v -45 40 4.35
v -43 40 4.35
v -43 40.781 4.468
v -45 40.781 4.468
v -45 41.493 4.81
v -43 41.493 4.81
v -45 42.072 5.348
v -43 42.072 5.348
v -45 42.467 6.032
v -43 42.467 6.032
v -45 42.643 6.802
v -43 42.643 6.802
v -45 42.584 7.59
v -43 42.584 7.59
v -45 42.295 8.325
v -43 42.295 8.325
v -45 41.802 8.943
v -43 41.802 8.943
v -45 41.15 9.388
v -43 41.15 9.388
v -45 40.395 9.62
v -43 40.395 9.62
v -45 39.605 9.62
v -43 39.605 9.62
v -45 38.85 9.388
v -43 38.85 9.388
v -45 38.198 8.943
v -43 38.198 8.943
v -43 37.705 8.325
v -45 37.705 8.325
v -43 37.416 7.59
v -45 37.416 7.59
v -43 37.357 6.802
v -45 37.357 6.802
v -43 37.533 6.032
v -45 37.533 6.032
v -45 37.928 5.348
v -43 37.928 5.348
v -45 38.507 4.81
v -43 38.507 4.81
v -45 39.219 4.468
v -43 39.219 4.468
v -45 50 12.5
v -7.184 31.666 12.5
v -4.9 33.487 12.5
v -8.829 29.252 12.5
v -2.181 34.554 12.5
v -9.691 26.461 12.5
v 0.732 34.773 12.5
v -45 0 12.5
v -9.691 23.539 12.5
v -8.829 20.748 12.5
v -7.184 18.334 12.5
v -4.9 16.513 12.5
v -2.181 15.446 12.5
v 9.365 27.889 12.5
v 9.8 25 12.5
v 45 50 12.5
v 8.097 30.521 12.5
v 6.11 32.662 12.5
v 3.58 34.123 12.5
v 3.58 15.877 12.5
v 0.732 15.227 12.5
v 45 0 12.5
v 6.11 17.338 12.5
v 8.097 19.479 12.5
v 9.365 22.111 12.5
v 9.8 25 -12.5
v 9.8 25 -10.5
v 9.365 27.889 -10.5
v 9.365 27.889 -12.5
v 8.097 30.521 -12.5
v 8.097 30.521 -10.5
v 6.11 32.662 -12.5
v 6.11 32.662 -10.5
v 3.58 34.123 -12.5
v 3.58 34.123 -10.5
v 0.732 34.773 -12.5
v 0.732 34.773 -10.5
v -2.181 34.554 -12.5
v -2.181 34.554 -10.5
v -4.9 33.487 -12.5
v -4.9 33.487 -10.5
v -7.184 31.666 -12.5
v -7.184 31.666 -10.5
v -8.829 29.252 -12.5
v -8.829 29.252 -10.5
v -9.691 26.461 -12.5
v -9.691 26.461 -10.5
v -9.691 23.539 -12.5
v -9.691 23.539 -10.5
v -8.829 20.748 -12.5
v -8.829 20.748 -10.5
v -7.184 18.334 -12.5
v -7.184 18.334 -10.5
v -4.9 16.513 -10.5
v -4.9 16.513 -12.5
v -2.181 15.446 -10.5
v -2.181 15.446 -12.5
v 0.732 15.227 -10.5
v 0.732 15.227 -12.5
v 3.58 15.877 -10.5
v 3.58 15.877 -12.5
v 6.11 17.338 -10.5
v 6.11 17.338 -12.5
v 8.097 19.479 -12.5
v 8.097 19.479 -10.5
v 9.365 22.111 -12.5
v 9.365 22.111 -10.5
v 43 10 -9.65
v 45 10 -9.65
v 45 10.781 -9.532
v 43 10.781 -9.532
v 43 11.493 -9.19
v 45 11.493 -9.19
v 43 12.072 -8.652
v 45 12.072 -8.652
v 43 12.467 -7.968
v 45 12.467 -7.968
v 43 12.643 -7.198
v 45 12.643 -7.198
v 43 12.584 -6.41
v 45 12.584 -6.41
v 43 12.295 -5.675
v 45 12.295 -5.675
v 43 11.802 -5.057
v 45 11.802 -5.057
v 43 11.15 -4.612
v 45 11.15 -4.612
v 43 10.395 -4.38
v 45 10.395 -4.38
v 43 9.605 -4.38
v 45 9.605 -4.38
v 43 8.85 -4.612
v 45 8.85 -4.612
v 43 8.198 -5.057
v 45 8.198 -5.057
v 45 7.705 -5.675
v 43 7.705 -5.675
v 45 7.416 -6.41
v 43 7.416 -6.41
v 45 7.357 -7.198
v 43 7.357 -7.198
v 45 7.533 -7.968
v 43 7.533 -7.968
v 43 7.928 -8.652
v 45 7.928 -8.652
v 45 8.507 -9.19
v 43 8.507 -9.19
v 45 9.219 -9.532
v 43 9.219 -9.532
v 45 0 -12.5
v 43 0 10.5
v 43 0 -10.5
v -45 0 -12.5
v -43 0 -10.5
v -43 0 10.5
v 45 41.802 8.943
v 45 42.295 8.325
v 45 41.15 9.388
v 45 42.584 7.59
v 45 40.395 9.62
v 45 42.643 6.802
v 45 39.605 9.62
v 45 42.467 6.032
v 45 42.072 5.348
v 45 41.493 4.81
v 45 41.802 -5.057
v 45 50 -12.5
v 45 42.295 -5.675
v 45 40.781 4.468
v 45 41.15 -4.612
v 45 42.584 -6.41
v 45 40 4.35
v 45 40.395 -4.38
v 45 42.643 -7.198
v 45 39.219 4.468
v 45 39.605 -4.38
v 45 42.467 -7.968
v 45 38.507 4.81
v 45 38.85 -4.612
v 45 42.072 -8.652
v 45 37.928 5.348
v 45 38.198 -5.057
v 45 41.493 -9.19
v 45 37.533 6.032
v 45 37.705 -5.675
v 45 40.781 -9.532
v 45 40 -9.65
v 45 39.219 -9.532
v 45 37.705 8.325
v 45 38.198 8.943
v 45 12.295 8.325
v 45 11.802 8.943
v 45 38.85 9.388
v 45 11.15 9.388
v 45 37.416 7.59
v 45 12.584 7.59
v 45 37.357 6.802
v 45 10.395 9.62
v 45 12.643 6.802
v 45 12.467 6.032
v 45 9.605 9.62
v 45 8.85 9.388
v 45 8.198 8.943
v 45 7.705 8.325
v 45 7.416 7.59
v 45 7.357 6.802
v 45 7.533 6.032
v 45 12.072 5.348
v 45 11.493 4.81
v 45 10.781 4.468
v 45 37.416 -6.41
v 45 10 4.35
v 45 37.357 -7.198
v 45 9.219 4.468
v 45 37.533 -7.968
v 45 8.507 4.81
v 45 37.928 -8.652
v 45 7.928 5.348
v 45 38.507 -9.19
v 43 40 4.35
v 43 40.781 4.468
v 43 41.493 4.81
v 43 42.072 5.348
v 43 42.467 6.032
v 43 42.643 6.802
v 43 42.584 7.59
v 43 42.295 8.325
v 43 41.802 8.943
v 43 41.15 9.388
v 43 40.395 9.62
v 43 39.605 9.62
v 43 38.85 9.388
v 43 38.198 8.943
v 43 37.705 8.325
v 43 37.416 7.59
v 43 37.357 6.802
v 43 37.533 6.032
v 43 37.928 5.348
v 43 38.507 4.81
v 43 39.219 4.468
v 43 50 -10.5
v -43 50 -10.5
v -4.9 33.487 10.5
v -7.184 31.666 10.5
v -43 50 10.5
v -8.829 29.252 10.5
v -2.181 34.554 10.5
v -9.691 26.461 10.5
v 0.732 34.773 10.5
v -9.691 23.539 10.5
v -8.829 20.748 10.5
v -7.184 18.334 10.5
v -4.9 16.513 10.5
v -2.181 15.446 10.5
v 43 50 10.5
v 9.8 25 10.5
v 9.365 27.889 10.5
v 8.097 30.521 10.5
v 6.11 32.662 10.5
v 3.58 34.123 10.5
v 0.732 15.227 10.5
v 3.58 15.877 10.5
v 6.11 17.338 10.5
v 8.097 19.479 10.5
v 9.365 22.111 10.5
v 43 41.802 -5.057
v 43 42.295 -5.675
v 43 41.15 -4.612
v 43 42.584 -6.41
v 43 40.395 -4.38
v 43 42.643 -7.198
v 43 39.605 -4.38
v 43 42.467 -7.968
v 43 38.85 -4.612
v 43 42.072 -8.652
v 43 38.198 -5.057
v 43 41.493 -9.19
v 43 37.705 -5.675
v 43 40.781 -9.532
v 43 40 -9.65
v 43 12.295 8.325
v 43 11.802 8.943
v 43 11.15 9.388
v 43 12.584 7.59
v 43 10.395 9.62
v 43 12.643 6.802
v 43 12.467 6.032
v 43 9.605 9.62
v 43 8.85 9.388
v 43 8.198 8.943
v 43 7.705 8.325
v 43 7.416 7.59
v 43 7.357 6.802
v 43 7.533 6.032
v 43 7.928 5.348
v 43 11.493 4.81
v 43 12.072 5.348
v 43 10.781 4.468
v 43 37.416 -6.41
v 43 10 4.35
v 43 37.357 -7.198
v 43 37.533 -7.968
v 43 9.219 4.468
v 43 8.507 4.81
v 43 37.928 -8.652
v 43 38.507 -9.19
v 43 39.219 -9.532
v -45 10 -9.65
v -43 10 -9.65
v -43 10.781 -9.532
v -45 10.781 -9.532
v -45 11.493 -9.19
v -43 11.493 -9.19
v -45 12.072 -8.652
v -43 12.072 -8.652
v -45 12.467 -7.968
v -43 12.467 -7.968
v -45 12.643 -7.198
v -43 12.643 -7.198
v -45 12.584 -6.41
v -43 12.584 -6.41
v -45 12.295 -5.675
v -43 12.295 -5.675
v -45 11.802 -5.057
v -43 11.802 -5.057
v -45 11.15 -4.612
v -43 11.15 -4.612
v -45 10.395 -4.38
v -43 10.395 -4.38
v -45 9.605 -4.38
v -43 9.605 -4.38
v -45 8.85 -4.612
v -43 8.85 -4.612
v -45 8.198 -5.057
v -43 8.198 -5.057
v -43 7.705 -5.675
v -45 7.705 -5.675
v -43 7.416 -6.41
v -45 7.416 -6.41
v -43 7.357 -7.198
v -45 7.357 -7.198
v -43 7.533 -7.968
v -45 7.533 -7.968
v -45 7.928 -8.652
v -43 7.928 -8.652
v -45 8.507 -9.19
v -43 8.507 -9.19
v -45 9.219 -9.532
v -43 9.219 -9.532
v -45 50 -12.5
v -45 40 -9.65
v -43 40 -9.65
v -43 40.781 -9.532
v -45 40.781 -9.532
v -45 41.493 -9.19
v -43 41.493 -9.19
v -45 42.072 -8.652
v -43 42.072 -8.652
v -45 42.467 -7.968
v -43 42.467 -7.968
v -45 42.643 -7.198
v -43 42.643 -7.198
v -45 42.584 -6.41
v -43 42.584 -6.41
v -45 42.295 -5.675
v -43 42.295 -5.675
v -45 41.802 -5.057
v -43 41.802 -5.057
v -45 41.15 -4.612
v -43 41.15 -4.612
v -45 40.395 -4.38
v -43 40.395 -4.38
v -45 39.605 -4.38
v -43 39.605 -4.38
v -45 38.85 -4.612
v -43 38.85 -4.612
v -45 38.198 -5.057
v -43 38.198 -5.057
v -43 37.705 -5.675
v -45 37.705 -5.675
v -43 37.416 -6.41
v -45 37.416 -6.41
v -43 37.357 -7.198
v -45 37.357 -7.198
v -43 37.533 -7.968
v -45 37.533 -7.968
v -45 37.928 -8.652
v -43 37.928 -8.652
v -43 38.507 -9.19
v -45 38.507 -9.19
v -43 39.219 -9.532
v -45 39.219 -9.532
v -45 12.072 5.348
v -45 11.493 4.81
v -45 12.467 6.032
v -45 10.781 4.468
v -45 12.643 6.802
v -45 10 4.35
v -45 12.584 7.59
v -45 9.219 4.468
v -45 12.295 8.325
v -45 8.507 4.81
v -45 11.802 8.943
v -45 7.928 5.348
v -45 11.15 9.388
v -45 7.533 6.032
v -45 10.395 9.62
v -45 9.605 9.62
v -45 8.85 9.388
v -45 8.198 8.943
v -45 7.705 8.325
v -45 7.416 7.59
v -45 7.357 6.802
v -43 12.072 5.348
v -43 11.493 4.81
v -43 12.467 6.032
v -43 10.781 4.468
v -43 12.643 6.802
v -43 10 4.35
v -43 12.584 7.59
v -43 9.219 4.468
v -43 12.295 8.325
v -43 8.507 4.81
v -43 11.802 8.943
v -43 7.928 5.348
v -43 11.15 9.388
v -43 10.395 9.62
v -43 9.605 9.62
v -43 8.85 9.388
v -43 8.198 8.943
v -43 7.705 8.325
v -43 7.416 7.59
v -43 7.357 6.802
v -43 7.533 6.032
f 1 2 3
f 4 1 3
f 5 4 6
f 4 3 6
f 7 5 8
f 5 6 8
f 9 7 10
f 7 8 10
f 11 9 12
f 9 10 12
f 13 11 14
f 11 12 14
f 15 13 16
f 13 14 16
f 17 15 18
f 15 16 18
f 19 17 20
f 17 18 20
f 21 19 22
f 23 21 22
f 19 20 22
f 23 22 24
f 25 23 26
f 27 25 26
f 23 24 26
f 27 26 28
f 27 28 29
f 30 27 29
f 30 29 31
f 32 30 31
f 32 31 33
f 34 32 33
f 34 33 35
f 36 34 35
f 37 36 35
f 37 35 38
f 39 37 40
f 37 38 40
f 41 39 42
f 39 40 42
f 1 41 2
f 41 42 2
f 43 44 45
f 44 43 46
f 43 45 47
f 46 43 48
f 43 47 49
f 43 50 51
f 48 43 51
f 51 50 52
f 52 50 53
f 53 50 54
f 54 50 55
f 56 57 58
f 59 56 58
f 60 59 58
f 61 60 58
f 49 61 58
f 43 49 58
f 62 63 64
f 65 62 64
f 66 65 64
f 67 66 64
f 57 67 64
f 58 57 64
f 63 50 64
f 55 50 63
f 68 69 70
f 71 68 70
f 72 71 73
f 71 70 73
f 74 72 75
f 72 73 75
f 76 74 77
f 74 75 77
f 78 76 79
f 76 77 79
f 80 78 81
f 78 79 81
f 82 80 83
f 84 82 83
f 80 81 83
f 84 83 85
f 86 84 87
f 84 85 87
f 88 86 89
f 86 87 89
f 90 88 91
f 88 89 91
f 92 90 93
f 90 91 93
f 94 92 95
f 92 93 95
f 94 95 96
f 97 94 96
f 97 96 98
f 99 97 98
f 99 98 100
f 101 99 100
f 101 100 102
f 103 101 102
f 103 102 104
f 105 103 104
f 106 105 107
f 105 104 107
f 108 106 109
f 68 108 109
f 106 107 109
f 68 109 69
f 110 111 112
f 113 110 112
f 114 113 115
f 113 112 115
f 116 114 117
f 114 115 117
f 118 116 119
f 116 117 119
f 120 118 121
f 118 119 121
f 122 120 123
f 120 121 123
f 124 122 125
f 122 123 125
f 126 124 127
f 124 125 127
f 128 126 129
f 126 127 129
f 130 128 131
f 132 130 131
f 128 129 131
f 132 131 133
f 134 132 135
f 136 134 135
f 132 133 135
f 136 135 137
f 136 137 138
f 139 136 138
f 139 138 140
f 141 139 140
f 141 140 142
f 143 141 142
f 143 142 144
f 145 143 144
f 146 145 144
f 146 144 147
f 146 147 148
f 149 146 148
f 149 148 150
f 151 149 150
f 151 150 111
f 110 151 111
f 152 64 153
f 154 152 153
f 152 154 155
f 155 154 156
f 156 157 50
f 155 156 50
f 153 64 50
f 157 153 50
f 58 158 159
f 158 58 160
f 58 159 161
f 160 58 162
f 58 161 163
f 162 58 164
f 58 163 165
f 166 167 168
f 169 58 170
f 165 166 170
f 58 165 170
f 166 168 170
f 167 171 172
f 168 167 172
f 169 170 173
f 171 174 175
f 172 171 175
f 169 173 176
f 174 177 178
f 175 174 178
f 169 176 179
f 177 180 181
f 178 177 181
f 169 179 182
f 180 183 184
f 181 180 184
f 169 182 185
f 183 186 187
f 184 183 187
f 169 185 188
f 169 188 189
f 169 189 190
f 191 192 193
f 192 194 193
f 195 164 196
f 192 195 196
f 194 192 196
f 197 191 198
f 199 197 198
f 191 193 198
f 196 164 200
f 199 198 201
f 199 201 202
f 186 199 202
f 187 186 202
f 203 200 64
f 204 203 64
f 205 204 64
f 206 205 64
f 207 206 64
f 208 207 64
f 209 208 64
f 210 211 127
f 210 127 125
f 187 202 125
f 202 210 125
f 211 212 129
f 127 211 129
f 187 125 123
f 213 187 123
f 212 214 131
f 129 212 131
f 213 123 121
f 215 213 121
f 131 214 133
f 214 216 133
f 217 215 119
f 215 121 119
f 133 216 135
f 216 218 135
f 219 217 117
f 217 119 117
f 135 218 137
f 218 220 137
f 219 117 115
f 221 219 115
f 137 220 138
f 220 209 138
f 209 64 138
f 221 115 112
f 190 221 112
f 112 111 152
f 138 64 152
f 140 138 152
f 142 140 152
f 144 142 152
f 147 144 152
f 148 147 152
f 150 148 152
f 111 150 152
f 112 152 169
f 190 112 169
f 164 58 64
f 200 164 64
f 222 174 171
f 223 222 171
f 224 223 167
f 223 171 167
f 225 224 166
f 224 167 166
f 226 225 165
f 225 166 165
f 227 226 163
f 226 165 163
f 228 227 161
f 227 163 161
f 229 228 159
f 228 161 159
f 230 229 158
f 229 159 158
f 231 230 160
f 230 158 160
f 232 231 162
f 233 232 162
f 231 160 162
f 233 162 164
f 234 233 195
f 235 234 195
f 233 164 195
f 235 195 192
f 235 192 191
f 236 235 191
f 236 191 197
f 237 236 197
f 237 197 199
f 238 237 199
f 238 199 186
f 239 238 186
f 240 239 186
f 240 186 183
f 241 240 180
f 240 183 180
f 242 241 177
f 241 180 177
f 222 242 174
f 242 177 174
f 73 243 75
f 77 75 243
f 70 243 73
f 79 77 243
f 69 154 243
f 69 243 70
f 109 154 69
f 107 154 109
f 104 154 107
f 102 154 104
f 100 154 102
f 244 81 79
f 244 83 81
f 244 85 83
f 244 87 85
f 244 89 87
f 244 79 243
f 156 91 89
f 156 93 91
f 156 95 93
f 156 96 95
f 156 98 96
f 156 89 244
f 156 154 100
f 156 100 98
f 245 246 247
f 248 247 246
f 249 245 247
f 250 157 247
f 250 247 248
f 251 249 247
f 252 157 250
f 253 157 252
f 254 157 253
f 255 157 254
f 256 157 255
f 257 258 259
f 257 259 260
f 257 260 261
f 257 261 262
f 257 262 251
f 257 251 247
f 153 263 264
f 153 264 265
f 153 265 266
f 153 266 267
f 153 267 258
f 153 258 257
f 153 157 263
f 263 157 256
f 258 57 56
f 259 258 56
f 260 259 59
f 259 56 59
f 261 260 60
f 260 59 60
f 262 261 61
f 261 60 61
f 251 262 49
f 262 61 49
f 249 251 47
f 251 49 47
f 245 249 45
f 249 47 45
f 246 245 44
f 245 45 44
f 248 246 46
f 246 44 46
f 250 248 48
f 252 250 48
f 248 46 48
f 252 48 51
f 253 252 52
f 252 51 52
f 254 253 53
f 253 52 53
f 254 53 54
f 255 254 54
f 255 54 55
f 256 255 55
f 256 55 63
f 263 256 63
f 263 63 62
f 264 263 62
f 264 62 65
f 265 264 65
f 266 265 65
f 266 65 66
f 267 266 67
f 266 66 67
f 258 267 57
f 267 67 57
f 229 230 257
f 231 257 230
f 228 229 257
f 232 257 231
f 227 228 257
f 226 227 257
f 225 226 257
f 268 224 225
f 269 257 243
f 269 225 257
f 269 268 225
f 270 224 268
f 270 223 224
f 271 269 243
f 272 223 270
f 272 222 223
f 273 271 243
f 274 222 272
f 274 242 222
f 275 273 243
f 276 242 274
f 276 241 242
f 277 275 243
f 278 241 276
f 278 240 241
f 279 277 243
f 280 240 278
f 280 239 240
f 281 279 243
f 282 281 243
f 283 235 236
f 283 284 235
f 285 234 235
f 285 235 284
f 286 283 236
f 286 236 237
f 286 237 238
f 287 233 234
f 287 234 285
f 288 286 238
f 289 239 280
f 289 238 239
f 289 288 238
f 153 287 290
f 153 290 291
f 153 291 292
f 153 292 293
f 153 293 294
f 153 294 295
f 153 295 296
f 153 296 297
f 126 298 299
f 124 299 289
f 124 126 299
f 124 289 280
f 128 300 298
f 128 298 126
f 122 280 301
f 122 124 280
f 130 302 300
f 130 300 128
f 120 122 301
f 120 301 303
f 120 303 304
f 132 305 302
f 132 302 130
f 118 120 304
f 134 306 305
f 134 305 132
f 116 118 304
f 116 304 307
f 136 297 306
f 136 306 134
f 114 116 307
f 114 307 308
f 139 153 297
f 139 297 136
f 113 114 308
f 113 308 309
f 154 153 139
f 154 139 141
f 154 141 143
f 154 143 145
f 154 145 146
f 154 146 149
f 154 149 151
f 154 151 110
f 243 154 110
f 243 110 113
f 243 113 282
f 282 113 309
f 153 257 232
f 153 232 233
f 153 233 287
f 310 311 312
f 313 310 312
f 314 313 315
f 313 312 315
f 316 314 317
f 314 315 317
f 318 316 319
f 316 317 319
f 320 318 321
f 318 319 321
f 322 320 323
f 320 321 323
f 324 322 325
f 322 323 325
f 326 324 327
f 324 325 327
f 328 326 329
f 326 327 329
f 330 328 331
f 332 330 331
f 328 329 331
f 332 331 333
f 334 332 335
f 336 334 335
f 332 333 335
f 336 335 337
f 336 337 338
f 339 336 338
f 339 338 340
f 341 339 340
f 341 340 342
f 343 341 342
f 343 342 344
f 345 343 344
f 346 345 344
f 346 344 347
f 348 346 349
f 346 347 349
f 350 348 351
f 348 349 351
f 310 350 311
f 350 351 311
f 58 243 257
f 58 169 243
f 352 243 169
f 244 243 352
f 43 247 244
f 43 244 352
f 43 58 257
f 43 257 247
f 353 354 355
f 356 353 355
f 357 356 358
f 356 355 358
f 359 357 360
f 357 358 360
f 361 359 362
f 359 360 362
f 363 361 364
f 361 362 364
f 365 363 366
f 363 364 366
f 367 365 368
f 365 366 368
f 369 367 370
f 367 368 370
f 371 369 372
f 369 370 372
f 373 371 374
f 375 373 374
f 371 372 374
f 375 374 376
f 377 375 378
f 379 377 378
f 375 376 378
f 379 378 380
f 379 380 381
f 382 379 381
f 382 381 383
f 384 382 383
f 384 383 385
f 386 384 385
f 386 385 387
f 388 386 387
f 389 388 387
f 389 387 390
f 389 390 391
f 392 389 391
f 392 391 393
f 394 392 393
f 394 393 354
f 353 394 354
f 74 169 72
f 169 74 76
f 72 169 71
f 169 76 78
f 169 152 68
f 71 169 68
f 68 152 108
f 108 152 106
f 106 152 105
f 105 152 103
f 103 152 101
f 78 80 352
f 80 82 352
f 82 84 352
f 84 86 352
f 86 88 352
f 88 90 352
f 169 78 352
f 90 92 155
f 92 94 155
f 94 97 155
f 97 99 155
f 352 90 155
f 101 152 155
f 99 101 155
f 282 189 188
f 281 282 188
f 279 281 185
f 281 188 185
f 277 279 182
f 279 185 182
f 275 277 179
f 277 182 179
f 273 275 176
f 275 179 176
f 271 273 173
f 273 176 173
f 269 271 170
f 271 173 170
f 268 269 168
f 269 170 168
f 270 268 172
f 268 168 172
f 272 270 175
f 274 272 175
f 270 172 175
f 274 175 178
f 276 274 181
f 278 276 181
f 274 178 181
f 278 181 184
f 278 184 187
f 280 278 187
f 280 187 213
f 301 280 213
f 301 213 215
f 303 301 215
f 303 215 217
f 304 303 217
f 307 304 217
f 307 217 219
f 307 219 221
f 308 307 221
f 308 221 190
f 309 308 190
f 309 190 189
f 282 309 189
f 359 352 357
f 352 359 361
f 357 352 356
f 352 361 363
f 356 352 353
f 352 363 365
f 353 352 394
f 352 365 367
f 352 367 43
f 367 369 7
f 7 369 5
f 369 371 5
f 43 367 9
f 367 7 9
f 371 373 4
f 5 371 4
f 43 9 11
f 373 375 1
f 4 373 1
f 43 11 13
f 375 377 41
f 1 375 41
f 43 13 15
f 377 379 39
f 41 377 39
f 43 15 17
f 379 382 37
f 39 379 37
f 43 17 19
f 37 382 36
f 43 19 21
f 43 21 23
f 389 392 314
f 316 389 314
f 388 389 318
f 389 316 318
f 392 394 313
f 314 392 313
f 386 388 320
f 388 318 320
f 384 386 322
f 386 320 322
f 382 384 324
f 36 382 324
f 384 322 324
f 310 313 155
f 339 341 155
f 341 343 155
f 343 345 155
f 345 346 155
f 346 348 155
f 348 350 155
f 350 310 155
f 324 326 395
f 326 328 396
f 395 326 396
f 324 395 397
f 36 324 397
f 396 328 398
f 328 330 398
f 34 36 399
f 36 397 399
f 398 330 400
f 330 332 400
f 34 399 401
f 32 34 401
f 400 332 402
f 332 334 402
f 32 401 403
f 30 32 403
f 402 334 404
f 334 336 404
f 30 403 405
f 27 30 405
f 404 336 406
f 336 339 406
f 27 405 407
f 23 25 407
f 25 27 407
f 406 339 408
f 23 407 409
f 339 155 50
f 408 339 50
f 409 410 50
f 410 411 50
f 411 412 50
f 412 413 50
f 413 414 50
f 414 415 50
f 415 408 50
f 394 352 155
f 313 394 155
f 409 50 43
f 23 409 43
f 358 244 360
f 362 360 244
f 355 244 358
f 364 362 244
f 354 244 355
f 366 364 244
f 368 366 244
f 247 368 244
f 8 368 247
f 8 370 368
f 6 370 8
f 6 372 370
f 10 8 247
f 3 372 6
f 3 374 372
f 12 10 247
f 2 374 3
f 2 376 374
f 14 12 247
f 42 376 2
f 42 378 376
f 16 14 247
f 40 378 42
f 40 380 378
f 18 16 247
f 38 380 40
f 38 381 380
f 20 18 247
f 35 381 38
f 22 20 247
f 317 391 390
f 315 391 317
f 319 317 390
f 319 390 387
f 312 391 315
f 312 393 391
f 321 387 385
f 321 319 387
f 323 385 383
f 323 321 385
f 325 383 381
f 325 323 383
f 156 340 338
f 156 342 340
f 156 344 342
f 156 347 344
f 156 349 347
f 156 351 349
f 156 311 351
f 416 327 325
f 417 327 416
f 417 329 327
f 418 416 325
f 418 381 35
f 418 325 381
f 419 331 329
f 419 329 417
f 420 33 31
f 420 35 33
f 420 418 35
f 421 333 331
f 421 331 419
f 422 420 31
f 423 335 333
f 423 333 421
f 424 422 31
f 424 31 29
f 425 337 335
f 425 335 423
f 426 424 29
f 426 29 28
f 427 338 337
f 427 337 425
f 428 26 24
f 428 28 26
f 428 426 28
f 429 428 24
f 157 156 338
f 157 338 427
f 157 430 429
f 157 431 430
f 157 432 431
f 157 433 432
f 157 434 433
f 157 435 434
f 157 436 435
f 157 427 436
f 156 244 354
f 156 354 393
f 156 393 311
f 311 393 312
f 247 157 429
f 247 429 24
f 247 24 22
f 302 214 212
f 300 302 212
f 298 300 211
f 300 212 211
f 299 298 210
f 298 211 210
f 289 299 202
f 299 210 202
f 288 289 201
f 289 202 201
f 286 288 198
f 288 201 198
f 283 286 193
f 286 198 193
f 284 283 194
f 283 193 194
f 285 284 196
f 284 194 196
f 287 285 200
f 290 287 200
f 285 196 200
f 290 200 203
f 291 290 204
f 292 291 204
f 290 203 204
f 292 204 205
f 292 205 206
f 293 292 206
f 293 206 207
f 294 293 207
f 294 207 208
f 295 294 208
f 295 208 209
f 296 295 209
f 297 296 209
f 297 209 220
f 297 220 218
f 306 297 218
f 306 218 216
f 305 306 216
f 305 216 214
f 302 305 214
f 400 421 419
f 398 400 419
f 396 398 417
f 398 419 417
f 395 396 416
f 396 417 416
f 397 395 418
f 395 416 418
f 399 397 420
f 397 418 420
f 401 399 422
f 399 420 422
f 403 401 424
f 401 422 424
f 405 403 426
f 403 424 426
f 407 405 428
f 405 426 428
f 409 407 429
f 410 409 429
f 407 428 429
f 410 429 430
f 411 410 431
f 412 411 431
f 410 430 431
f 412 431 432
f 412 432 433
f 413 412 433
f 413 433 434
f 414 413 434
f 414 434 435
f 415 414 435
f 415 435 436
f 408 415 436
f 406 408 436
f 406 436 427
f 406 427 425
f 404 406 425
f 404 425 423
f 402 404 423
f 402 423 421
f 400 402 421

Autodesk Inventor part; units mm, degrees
ref_plane "YZ Plane" through (0, 0, 0) normal (1, 0, 0) x (0, 1, 0)
ref_plane "XZ Plane" through (0, 0, 0) normal (0, 1, 0) x (-1, 0, 0)
ref_plane "XY Plane" through (0, 0, 0) normal (0, 0, 1) x (1, 0, 0)
sketch "Sketch1" plane through (0, 0, 0) normal (0, 1, 0) x (-1, 0, 0)
  line L0 (45, 12.5) -> (-45, 12.5)
  line L1 (-45, 12.5) -> (-45, -12.5)
  line L2 (-45, -12.5) -> (45, -12.5)
  line L3 (45, -12.5) -> (45, 12.5)
  line L4 (45, 12.5) -> (-45, -12.5) construction
  line L5 (-45, 12.5) -> (45, -12.5) construction
  line L6 (43, 10.5) -> (-43, 10.5)
  line L7 (-43, 10.5) -> (-43, -10.5)
  line L8 (-43, -10.5) -> (43, -10.5)
  line L9 (43, -10.5) -> (43, 10.5)
  line L10 (43, 10.5) -> (-43, -10.5) construction
  line L11 (-43, 10.5) -> (43, -10.5) construction
  point P0 (0, 0)
  dimension "d0" = 90
  dimension "d1" = 25
  dimension "d2" = 86
  dimension "d3" = 21
extrude "Extrusion1" add sketch "Sketch1" along normal blind 50
sketch "Sketch2" plane through (-45, 0, 12.5) normal (0, 0, 1) x (1, 0, 0)
  circle A0 centre (45, 25) radius 9.8
  line L0 (90, 0) -> (90, 50) projected
  line L1 (0, 50) -> (90, 50) projected
  point P0 (45, 0)
  dimension "d6" = 19.6
  dimension "d7" = 45
  dimension "d8" = 25
extrude "Extrusion2" cut sketch "Sketch2" against normal blind 29.05
sketch "Sketch3" plane through (45, 0, 12.5) normal (1, 0, 0) x (0, 0, -1)
  circle A0 centre (19.5, 10) radius 2.65
  circle A1 centre (5.5, 10) radius 2.65
  circle A2 centre (19.5, 40) radius 2.65
  circle A3 centre (5.5, 40) radius 2.65
  line L0 (0, 50) -> (25, 50) projected
  line L1 (25, 0) -> (25, 50) projected
  line L2 (0, 0) -> (0, 50) projected
  line L3 (0, 0) -> (25, 0) projected
  point P0 (12.5, 0)
  dimension "d11" = 5.3
  dimension "d12" = 5.3
  dimension "d13" = 5.3
  dimension "d14" = 5.3
  dimension "d15" = 10
  dimension "d16" = 10
  dimension "d17" = 5.5
  dimension "d18" = 5.5
  dimension "d19" = 10
  dimension "d20" = 5.5
  dimension "d21" = 5.5
  dimension "d22" = 10
extrude "Extrusion3" cut sketch "Sketch3" against normal blind 143.35 contours A0 | A1 | A2 | A3
properties part number "Bevel holder"
